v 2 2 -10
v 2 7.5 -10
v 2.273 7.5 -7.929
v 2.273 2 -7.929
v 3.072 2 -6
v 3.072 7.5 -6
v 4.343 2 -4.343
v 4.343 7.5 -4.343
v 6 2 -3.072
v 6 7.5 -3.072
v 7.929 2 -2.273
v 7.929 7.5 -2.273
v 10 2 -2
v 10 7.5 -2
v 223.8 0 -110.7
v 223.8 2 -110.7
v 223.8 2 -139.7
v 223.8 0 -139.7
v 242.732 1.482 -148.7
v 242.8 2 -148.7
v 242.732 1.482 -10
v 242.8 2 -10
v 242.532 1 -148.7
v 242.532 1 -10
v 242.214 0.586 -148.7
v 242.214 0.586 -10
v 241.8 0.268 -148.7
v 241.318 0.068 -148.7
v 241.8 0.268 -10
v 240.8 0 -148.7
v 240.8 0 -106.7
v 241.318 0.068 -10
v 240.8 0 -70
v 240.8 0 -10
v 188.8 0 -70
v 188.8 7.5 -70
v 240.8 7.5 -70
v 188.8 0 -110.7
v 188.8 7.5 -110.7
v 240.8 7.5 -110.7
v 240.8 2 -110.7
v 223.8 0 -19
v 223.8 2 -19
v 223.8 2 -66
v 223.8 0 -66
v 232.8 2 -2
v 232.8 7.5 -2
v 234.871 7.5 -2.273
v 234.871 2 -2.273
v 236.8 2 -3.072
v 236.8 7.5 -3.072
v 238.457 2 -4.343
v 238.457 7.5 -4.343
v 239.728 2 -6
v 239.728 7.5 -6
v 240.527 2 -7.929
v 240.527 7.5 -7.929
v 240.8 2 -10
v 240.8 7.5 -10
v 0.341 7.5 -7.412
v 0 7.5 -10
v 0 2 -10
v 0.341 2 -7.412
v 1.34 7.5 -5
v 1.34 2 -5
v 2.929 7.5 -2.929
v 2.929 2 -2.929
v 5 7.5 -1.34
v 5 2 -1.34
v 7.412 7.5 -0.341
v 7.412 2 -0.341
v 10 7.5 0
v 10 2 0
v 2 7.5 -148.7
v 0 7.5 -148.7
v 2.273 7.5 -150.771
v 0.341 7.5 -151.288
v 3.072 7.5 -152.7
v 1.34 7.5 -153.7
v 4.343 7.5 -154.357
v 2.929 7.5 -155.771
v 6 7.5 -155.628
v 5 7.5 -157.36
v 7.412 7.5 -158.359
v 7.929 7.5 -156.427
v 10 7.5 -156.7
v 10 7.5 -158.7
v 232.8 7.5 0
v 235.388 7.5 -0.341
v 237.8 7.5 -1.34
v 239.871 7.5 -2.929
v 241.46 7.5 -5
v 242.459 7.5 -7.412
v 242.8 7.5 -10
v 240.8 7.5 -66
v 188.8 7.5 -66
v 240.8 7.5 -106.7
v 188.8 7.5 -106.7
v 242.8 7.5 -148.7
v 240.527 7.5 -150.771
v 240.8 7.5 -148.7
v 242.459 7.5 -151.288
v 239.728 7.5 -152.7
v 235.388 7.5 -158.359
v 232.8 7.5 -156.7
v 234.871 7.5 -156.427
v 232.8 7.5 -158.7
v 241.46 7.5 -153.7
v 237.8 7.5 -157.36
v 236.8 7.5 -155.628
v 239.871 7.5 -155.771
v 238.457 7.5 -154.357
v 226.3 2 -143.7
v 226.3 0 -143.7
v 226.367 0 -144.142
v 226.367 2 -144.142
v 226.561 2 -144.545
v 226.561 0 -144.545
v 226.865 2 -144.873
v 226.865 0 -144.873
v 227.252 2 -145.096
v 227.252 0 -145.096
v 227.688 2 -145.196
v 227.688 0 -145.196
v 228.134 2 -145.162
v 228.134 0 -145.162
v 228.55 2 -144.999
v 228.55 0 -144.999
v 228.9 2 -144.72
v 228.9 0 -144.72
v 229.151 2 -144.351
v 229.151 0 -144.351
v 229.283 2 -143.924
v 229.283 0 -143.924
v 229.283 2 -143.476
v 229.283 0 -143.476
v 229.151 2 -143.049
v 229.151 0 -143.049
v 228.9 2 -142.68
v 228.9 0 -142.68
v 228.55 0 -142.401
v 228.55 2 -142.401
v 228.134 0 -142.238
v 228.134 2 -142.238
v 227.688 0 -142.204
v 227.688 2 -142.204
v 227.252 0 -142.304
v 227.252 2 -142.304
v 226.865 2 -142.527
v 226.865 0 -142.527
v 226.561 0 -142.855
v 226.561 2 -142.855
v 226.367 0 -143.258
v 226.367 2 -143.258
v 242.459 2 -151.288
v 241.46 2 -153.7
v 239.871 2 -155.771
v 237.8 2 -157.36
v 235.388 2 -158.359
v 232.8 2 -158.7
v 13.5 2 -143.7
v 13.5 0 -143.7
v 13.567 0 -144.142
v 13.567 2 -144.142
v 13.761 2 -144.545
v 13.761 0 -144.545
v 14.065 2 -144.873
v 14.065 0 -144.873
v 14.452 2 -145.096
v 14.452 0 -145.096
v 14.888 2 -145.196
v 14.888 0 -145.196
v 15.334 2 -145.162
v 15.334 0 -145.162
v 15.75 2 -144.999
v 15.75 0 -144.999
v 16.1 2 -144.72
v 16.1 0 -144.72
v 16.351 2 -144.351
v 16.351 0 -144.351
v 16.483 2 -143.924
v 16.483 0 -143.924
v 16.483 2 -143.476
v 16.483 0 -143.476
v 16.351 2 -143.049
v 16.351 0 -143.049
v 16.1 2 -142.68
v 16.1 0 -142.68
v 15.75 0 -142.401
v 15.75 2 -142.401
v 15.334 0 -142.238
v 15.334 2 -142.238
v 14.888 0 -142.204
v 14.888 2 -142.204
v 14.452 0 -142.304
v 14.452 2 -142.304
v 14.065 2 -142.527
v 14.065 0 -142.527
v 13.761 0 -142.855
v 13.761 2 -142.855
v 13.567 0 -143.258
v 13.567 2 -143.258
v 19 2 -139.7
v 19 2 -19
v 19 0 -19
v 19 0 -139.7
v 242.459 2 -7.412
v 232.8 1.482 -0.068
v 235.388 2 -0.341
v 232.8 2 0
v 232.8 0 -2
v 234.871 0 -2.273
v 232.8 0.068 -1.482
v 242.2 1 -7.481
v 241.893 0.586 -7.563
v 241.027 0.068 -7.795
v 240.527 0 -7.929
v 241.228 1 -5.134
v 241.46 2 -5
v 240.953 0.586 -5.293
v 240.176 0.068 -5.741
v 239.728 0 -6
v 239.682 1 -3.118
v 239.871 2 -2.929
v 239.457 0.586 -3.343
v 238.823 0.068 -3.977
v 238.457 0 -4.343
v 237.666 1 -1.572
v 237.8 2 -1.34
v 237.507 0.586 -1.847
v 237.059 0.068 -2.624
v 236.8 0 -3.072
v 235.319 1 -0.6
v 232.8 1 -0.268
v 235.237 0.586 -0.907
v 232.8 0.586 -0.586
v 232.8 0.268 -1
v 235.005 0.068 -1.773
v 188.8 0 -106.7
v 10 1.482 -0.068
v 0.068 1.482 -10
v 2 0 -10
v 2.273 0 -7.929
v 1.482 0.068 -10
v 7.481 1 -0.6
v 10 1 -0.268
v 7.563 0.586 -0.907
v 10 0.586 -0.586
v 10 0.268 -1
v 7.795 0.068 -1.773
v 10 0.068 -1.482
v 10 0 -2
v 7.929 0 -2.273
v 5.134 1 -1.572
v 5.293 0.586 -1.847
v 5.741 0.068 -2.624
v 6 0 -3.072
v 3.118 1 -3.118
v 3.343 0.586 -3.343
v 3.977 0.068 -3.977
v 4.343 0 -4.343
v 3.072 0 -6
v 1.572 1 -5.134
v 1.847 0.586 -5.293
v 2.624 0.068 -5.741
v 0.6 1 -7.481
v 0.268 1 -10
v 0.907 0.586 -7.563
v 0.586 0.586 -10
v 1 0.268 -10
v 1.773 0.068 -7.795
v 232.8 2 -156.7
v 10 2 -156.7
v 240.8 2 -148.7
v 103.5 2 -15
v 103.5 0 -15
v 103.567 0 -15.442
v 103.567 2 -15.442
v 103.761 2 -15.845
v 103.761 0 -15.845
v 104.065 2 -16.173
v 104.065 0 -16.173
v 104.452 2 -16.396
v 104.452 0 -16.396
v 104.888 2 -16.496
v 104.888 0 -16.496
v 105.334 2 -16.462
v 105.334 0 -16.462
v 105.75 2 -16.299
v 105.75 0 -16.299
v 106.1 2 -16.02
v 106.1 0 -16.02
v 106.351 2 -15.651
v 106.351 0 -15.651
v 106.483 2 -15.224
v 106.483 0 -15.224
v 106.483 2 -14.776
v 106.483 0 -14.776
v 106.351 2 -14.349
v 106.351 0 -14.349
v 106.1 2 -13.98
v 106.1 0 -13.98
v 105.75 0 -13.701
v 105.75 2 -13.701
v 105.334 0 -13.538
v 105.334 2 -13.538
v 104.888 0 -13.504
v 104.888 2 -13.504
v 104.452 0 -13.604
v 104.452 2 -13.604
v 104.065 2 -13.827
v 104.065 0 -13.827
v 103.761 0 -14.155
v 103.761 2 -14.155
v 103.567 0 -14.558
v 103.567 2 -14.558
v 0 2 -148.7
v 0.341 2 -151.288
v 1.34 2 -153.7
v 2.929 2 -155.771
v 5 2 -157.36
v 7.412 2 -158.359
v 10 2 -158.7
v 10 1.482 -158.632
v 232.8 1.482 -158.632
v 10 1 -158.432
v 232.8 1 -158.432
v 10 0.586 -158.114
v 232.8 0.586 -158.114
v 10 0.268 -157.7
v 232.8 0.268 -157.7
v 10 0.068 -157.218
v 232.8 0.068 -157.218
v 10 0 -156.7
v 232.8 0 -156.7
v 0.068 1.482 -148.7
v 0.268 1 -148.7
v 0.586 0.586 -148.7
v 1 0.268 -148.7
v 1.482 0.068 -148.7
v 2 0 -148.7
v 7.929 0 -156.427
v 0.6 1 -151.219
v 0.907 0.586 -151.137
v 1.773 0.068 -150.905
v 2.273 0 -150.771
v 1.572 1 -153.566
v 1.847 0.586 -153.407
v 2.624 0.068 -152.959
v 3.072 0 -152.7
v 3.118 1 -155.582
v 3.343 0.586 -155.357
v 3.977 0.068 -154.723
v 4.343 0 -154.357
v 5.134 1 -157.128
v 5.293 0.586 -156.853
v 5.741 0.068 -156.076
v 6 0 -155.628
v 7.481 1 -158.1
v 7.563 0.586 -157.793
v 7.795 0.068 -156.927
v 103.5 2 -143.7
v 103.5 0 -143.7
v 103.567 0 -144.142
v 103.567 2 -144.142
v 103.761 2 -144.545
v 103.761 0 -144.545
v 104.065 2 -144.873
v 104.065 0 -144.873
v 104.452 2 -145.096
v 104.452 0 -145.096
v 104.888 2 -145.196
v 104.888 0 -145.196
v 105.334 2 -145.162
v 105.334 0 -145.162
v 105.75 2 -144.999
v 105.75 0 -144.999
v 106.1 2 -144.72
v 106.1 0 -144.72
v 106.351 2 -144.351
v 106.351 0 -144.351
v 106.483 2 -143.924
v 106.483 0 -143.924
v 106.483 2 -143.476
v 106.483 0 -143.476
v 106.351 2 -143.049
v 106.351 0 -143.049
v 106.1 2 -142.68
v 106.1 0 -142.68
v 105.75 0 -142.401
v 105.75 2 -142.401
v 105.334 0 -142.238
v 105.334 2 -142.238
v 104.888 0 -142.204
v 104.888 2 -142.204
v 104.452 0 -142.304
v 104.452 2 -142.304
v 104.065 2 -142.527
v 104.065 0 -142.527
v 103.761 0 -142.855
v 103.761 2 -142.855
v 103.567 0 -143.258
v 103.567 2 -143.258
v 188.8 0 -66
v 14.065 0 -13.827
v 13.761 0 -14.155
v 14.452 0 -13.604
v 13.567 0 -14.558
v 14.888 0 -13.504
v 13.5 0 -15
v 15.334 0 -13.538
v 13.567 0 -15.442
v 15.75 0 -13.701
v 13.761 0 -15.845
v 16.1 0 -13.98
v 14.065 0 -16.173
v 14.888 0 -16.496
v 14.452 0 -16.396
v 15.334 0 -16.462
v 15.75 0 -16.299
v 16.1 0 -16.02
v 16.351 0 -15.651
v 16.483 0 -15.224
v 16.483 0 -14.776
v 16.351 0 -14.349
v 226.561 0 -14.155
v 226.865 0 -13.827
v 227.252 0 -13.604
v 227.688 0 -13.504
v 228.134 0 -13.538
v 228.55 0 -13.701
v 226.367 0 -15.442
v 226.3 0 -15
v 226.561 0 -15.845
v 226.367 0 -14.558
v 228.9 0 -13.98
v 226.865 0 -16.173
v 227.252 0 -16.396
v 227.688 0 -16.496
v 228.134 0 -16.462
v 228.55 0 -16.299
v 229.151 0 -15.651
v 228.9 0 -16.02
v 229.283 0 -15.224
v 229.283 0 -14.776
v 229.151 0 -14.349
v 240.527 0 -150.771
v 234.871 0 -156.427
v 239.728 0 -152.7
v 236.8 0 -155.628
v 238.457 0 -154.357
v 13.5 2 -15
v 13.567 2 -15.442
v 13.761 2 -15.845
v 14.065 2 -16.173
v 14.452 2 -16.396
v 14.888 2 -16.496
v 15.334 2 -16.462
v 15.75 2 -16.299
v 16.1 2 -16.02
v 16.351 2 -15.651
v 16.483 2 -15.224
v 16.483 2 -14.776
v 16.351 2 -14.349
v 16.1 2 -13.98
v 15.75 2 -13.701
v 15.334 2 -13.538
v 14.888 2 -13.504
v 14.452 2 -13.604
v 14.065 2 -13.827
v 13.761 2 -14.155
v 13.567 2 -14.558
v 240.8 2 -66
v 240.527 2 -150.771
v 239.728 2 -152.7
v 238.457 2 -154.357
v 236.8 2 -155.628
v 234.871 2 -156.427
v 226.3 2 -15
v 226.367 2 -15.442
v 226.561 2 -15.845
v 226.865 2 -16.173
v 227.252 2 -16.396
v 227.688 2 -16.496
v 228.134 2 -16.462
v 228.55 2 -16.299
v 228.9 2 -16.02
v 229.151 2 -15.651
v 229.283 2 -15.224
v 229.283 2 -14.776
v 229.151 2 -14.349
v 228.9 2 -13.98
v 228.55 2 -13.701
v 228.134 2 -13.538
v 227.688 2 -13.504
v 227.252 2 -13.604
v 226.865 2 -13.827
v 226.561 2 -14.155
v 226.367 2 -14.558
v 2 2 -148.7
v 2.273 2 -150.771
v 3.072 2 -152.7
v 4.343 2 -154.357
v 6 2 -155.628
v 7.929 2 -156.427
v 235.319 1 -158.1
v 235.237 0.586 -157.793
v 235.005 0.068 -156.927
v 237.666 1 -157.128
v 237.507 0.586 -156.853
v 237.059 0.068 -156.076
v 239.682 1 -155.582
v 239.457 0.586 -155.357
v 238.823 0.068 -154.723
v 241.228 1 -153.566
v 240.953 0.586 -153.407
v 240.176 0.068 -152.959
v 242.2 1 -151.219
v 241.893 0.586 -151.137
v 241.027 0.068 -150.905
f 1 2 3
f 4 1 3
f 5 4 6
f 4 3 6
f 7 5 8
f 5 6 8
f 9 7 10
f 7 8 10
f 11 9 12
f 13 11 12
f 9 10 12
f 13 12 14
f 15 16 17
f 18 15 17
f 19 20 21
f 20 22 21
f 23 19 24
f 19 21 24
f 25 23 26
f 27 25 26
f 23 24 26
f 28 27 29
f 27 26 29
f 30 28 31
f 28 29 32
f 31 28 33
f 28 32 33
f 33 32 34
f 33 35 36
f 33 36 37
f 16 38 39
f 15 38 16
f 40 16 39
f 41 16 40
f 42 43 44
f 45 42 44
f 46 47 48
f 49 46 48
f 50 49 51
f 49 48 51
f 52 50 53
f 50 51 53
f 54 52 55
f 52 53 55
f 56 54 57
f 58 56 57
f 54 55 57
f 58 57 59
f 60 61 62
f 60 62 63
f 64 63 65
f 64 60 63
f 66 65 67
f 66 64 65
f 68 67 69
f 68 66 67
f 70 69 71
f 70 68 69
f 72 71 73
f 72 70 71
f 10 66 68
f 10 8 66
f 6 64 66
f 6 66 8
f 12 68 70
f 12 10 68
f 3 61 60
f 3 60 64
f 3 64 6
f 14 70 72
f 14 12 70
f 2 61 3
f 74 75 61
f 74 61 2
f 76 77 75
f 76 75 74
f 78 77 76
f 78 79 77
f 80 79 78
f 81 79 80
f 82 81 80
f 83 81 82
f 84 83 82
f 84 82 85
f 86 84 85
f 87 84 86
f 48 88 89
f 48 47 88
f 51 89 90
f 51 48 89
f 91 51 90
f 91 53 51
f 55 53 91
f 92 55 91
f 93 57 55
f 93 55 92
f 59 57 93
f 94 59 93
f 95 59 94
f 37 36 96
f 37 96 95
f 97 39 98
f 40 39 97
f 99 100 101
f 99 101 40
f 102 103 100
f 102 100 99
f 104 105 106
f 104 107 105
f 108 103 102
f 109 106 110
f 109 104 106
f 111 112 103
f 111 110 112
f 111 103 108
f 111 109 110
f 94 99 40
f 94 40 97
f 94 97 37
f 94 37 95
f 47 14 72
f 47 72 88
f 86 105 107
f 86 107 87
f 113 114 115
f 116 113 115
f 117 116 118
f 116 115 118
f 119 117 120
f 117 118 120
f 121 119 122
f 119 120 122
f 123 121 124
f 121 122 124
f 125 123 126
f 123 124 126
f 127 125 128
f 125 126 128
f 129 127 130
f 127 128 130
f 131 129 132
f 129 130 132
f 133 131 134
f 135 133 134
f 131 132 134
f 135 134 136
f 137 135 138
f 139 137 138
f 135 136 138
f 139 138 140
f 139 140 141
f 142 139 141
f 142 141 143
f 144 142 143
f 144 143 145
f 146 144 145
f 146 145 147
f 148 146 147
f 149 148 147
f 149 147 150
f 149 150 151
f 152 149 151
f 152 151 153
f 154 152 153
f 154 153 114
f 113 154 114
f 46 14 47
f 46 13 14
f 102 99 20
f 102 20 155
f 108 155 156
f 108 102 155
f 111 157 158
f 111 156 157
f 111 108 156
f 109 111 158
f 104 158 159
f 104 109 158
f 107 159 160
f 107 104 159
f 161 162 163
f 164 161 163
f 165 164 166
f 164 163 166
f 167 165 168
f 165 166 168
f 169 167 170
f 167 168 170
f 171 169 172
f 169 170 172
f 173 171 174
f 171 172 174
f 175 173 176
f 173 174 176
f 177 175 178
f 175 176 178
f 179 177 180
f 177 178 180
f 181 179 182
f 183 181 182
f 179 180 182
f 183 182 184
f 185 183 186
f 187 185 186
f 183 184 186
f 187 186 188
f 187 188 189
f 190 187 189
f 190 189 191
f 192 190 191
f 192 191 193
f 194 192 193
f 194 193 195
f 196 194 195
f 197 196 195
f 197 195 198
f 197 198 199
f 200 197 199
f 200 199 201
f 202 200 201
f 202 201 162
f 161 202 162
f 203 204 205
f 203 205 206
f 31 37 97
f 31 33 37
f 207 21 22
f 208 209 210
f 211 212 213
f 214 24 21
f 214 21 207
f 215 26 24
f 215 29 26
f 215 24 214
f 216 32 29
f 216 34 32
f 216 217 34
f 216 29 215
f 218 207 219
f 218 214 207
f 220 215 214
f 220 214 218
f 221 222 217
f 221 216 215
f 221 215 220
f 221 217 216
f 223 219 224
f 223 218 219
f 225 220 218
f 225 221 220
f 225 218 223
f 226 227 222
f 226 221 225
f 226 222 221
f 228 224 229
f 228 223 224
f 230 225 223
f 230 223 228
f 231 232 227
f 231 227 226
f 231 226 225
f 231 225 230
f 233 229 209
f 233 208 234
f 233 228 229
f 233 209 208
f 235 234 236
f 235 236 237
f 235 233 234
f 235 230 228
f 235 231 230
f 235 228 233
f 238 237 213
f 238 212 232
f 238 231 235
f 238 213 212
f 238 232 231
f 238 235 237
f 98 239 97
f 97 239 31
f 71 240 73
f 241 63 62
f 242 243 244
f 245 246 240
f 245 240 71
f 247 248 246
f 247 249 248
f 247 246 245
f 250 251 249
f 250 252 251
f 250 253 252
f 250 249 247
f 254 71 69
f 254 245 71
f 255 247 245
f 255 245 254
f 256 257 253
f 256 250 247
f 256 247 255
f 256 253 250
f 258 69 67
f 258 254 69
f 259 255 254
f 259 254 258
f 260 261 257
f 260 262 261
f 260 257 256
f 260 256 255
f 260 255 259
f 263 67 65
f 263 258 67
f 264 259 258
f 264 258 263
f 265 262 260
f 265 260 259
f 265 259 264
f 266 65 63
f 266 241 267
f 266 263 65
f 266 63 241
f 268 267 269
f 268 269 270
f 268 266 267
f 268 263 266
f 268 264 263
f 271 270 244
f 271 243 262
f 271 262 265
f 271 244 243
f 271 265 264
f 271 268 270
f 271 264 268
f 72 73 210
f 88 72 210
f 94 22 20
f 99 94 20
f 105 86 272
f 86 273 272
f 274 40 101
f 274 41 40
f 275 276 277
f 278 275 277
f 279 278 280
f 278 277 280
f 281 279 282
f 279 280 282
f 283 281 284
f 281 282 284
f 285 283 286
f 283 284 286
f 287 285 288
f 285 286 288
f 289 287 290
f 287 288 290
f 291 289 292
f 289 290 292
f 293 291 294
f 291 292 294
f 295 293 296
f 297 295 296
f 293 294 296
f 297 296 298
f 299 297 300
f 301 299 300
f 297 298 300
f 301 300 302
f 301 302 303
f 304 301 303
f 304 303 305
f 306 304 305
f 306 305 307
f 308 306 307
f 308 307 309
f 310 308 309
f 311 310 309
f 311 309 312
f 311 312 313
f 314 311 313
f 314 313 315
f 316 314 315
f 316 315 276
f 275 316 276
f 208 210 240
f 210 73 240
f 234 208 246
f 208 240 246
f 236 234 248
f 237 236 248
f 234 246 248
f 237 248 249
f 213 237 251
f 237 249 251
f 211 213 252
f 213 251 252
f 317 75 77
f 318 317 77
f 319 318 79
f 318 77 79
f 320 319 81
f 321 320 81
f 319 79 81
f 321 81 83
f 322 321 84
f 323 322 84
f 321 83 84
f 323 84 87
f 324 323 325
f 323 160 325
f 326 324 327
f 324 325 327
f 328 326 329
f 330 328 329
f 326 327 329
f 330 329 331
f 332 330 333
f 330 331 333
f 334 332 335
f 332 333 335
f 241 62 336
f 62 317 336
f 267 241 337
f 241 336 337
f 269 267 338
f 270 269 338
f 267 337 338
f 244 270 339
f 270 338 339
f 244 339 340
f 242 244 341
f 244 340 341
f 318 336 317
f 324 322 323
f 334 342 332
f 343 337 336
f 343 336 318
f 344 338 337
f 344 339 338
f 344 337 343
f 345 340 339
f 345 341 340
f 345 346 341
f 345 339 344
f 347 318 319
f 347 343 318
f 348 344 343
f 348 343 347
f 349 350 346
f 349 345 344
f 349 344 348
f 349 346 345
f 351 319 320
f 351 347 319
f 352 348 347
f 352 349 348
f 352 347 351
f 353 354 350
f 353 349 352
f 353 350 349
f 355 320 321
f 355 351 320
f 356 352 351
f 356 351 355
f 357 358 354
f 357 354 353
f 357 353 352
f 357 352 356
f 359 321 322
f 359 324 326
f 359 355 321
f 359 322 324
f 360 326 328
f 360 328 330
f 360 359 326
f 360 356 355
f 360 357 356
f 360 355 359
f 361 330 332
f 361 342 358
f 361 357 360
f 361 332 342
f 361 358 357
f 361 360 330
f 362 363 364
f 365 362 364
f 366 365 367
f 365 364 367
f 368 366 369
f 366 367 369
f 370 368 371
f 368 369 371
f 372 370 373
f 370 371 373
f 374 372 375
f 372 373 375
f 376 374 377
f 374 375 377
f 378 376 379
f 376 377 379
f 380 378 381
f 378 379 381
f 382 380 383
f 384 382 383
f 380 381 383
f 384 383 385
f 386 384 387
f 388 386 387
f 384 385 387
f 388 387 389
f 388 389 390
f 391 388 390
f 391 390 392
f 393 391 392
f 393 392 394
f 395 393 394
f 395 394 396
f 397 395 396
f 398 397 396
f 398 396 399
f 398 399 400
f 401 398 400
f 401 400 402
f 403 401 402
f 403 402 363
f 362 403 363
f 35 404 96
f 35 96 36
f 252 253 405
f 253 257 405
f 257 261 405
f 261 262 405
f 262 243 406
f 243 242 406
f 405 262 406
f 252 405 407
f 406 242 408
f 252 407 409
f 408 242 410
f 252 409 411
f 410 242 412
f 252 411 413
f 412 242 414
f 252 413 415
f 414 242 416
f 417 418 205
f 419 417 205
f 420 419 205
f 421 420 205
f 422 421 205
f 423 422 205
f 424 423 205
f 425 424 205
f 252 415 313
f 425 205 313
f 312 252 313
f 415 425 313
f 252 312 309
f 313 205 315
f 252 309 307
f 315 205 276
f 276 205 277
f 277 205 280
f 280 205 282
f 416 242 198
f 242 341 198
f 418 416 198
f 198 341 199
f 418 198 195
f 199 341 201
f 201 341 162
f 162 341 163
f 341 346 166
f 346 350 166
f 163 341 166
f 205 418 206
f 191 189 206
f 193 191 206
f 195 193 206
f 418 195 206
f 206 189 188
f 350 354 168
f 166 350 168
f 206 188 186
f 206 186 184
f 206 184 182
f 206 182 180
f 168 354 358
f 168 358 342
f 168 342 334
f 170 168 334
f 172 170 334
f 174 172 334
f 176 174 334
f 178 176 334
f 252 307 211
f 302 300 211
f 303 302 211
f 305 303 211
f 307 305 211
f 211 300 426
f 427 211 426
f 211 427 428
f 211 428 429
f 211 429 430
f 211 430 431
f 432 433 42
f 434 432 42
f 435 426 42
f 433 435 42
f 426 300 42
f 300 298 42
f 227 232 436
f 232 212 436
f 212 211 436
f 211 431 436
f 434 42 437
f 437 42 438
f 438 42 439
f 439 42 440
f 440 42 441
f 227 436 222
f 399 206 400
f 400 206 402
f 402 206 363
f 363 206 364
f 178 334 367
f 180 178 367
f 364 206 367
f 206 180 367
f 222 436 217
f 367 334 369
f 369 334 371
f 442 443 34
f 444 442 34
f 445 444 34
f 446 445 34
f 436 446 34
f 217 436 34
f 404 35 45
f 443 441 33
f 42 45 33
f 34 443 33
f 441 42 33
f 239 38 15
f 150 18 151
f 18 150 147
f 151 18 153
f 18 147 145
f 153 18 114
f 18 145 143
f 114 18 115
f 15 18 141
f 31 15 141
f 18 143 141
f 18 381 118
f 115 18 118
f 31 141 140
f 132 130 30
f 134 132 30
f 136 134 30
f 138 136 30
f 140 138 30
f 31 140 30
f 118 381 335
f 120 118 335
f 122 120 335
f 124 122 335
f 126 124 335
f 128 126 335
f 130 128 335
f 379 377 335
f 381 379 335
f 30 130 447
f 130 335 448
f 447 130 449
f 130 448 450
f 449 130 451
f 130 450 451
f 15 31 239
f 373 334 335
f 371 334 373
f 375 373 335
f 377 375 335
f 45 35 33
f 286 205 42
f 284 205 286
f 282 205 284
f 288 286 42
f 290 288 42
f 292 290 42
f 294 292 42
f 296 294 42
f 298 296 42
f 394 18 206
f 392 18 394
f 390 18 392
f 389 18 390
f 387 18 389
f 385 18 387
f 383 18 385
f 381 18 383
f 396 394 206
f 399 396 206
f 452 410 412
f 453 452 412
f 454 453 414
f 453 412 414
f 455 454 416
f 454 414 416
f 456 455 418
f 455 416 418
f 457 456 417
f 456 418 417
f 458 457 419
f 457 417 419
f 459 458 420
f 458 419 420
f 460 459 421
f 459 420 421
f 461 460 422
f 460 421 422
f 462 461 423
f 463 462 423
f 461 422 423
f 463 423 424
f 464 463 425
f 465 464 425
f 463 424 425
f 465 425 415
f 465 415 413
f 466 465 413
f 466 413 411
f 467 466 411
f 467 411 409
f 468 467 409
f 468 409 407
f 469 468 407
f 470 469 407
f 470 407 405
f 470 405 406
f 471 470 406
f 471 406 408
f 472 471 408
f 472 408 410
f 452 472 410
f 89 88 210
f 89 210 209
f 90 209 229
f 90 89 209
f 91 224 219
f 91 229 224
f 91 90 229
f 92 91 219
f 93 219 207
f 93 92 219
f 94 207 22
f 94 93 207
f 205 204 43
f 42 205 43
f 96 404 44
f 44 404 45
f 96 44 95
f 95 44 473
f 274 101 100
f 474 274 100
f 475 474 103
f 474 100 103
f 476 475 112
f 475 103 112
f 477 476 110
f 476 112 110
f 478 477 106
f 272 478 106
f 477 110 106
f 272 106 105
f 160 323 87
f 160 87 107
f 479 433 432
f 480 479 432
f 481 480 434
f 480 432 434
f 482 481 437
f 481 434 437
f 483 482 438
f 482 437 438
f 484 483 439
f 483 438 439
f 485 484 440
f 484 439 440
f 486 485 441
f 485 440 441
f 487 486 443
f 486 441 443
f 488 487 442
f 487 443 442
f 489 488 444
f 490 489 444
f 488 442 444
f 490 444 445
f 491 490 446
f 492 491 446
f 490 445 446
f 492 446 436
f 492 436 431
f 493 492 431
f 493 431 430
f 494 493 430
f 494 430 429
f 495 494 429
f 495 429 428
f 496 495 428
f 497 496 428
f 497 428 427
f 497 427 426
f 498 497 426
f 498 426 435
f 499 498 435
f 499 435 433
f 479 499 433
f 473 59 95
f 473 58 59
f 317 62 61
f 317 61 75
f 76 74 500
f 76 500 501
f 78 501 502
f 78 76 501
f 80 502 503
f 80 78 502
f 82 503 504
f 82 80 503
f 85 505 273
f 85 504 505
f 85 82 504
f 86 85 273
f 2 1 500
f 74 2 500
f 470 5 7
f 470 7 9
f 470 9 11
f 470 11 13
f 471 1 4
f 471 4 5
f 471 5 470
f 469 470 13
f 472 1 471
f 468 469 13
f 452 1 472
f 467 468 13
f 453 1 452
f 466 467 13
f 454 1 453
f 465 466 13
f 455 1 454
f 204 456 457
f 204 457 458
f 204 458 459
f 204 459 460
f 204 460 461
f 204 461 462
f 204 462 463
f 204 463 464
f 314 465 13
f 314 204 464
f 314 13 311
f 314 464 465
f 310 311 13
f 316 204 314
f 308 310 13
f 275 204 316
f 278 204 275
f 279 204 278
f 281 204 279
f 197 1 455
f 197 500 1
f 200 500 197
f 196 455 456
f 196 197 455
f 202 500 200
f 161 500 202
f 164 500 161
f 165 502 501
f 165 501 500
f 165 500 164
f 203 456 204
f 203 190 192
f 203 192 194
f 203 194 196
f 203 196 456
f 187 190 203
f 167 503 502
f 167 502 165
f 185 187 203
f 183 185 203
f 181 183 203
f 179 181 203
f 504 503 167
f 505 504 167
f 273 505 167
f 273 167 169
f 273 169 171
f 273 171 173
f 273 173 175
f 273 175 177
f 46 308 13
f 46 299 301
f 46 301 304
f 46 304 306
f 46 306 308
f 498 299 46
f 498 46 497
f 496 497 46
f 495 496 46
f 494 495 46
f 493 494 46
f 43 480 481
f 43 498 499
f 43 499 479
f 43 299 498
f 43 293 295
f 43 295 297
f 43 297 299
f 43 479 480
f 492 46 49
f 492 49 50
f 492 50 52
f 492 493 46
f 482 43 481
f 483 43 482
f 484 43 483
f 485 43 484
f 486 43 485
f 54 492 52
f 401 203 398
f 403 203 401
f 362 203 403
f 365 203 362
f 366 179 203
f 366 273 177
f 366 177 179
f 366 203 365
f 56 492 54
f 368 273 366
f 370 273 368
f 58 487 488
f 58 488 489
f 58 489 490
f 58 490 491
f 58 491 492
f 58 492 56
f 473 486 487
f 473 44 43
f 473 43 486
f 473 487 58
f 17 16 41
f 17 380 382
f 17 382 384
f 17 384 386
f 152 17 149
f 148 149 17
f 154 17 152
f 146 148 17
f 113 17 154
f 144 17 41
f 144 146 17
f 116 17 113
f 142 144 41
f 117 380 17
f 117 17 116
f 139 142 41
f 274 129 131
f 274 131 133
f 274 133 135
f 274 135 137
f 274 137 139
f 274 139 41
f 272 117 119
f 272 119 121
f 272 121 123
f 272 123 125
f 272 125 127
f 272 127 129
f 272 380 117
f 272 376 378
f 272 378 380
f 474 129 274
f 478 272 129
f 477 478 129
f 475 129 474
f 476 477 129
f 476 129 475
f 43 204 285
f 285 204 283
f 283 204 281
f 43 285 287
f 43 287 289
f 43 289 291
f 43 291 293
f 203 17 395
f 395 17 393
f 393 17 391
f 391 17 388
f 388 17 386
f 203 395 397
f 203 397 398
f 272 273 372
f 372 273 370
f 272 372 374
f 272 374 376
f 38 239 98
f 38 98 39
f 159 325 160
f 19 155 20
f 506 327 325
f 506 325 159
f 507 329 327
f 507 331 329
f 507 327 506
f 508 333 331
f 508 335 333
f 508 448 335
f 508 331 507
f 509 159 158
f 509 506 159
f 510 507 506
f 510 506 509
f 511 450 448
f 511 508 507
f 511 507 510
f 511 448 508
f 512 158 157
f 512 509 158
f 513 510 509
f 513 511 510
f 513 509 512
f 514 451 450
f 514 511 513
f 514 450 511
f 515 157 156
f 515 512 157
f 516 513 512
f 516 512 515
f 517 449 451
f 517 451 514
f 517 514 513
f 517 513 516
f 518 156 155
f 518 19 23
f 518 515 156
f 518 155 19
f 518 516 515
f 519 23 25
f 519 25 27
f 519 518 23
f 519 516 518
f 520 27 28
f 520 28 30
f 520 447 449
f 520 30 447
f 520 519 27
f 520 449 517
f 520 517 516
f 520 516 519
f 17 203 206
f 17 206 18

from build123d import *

# Parameters (mm, degrees)
SKIZZE1_W                          = 242.8
SKIZZE1_H                          = 158.7
AUFSATZ_LINEAR_AUSTRAGEN1_DEPTH    = 7.5
VERRUNDUNG1_R                      = 10
WANDUNG1_T                         = -2
F_3_0_3_DURCHMESSER_BOHRUNG1_D     = 3
F_3_0_3_DURCHMESSER_BOHRUNG1_DEPTH = 6
F_3_0_3_DURCHMESSER_BOHRUNG1_TIP   = 0.901290929
SKIZZE5_W                          = 204.8
SKIZZE5_H                          = 120.7
SCHNITT_LINEAR_AUSTRAGEN1_DEPTH    = 291.116838532
VERRUNDUNG2_R                      = 2
SKIZZE6_W                          = 17
SKIZZE6_H                          = 36.7
SCHNITT_LINEAR_AUSTRAGEN2_DEPTH    = 7.5
AUFSATZ_LINEAR_START               = -2
SKIZZE8_W                          = 52
SKIZZE8_H                          = 4
AUFSATZ_LINEAR_AUSTRAGEN2_DEPTH    = 7.5


with BuildPart() as part:
    # Skizze1 → Aufsatz-Linear austragen1 (new body)
    with BuildSketch(Plane(origin=(0, 0, 0), x_dir=(1, 0, 0), z_dir=(0, 1, 0))):
        with Locations((121.4, 79.35)):
            Rectangle(SKIZZE1_W, SKIZZE1_H)
    extrude(amount=AUFSATZ_LINEAR_AUSTRAGEN1_DEPTH)

    # Verrundung1
    verrundung1_edges = [part.edges().sort_by_distance(p)[0] for p in [
        (0, 3.75, -158.7),
        (242.8, 3.75, -158.7),
        (242.8, 3.75, 0),
        (0, 3.75, 0),
    ]]
    fillet(verrundung1_edges, radius=VERRUNDUNG1_R)

    # Wandung1
    wandung1_openings = [part.faces().sort_by_distance(p)[0] for p in [
        (121.4, 7.5, -79.35),
    ]]
    offset(amount=WANDUNG1_T, openings=wandung1_openings, kind=Kind.INTERSECTION)

    # Ø3.0 (3) Durchmesser Bohrung1
    with Locations(Plane(origin=(0, 2, 0), x_dir=(1, 0, 0), z_dir=(0, 1, 0))):
        with Locations((15, 143.7), (105, 143.7), (227.8, 143.7), (227.8, 15), (105, 15), (15, 15)):
            Hole(F_3_0_3_DURCHMESSER_BOHRUNG1_D / 2, depth=F_3_0_3_DURCHMESSER_BOHRUNG1_DEPTH)
            with Locations((0, 0, -(F_3_0_3_DURCHMESSER_BOHRUNG1_DEPTH + F_3_0_3_DURCHMESSER_BOHRUNG1_TIP / 2))):  # 118° drill point
                Cone(0, F_3_0_3_DURCHMESSER_BOHRUNG1_D / 2, F_3_0_3_DURCHMESSER_BOHRUNG1_TIP, mode=Mode.SUBTRACT)

    # Skizze5 → Schnitt-Linear austragen1 (cut, through all)
    with BuildSketch(Plane(origin=(0, 2, 0), x_dir=(1, 0, 0), z_dir=(0, 1, 0))):
        with Locations((121.4, 79.35)):
            Rectangle(SKIZZE5_W, SKIZZE5_H)
    extrude(amount=-SCHNITT_LINEAR_AUSTRAGEN1_DEPTH, mode=Mode.SUBTRACT)

    # Verrundung2
    verrundung2_edges = [part.edges().sort_by_distance(p)[0] for p in [
        (0, 0, -79.35),
        (121.4, 0, -158.7),
        (242.8, 0, -79.35),
        (121.4, 0, 0),
        (239.871067812, 0, -2.928932188),
        (2.928932188, 0, -2.928932188),
        (239.871067812, 0, -155.771067812),
        (2.928932188, 0, -155.771067812),
    ]]
    fillet(verrundung2_edges, radius=VERRUNDUNG2_R)

    # Skizze6 → Schnitt-Linear austragen2 (cut)
    with BuildSketch(Plane.XZ):
        with Locations((232.3, -88.35)):
            Rectangle(SKIZZE6_W, SKIZZE6_H)
    extrude(amount=-SCHNITT_LINEAR_AUSTRAGEN2_DEPTH, mode=Mode.SUBTRACT)

    # Skizze8 → Aufsatz-Linear austragen2 (add)
    with BuildSketch(Plane(origin=(0, 2, 0), x_dir=(1, 0, 0), z_dir=(0, 1, 0)).offset(AUFSATZ_LINEAR_START)):
        with Locations((214.8, 108.7)):
            Rectangle(SKIZZE8_W, SKIZZE8_H)
        with Locations((214.8, 68)):
            Rectangle(SKIZZE8_W, SKIZZE8_H)
    extrude(amount=AUFSATZ_LINEAR_AUSTRAGEN2_DEPTH)


solid = part.part
